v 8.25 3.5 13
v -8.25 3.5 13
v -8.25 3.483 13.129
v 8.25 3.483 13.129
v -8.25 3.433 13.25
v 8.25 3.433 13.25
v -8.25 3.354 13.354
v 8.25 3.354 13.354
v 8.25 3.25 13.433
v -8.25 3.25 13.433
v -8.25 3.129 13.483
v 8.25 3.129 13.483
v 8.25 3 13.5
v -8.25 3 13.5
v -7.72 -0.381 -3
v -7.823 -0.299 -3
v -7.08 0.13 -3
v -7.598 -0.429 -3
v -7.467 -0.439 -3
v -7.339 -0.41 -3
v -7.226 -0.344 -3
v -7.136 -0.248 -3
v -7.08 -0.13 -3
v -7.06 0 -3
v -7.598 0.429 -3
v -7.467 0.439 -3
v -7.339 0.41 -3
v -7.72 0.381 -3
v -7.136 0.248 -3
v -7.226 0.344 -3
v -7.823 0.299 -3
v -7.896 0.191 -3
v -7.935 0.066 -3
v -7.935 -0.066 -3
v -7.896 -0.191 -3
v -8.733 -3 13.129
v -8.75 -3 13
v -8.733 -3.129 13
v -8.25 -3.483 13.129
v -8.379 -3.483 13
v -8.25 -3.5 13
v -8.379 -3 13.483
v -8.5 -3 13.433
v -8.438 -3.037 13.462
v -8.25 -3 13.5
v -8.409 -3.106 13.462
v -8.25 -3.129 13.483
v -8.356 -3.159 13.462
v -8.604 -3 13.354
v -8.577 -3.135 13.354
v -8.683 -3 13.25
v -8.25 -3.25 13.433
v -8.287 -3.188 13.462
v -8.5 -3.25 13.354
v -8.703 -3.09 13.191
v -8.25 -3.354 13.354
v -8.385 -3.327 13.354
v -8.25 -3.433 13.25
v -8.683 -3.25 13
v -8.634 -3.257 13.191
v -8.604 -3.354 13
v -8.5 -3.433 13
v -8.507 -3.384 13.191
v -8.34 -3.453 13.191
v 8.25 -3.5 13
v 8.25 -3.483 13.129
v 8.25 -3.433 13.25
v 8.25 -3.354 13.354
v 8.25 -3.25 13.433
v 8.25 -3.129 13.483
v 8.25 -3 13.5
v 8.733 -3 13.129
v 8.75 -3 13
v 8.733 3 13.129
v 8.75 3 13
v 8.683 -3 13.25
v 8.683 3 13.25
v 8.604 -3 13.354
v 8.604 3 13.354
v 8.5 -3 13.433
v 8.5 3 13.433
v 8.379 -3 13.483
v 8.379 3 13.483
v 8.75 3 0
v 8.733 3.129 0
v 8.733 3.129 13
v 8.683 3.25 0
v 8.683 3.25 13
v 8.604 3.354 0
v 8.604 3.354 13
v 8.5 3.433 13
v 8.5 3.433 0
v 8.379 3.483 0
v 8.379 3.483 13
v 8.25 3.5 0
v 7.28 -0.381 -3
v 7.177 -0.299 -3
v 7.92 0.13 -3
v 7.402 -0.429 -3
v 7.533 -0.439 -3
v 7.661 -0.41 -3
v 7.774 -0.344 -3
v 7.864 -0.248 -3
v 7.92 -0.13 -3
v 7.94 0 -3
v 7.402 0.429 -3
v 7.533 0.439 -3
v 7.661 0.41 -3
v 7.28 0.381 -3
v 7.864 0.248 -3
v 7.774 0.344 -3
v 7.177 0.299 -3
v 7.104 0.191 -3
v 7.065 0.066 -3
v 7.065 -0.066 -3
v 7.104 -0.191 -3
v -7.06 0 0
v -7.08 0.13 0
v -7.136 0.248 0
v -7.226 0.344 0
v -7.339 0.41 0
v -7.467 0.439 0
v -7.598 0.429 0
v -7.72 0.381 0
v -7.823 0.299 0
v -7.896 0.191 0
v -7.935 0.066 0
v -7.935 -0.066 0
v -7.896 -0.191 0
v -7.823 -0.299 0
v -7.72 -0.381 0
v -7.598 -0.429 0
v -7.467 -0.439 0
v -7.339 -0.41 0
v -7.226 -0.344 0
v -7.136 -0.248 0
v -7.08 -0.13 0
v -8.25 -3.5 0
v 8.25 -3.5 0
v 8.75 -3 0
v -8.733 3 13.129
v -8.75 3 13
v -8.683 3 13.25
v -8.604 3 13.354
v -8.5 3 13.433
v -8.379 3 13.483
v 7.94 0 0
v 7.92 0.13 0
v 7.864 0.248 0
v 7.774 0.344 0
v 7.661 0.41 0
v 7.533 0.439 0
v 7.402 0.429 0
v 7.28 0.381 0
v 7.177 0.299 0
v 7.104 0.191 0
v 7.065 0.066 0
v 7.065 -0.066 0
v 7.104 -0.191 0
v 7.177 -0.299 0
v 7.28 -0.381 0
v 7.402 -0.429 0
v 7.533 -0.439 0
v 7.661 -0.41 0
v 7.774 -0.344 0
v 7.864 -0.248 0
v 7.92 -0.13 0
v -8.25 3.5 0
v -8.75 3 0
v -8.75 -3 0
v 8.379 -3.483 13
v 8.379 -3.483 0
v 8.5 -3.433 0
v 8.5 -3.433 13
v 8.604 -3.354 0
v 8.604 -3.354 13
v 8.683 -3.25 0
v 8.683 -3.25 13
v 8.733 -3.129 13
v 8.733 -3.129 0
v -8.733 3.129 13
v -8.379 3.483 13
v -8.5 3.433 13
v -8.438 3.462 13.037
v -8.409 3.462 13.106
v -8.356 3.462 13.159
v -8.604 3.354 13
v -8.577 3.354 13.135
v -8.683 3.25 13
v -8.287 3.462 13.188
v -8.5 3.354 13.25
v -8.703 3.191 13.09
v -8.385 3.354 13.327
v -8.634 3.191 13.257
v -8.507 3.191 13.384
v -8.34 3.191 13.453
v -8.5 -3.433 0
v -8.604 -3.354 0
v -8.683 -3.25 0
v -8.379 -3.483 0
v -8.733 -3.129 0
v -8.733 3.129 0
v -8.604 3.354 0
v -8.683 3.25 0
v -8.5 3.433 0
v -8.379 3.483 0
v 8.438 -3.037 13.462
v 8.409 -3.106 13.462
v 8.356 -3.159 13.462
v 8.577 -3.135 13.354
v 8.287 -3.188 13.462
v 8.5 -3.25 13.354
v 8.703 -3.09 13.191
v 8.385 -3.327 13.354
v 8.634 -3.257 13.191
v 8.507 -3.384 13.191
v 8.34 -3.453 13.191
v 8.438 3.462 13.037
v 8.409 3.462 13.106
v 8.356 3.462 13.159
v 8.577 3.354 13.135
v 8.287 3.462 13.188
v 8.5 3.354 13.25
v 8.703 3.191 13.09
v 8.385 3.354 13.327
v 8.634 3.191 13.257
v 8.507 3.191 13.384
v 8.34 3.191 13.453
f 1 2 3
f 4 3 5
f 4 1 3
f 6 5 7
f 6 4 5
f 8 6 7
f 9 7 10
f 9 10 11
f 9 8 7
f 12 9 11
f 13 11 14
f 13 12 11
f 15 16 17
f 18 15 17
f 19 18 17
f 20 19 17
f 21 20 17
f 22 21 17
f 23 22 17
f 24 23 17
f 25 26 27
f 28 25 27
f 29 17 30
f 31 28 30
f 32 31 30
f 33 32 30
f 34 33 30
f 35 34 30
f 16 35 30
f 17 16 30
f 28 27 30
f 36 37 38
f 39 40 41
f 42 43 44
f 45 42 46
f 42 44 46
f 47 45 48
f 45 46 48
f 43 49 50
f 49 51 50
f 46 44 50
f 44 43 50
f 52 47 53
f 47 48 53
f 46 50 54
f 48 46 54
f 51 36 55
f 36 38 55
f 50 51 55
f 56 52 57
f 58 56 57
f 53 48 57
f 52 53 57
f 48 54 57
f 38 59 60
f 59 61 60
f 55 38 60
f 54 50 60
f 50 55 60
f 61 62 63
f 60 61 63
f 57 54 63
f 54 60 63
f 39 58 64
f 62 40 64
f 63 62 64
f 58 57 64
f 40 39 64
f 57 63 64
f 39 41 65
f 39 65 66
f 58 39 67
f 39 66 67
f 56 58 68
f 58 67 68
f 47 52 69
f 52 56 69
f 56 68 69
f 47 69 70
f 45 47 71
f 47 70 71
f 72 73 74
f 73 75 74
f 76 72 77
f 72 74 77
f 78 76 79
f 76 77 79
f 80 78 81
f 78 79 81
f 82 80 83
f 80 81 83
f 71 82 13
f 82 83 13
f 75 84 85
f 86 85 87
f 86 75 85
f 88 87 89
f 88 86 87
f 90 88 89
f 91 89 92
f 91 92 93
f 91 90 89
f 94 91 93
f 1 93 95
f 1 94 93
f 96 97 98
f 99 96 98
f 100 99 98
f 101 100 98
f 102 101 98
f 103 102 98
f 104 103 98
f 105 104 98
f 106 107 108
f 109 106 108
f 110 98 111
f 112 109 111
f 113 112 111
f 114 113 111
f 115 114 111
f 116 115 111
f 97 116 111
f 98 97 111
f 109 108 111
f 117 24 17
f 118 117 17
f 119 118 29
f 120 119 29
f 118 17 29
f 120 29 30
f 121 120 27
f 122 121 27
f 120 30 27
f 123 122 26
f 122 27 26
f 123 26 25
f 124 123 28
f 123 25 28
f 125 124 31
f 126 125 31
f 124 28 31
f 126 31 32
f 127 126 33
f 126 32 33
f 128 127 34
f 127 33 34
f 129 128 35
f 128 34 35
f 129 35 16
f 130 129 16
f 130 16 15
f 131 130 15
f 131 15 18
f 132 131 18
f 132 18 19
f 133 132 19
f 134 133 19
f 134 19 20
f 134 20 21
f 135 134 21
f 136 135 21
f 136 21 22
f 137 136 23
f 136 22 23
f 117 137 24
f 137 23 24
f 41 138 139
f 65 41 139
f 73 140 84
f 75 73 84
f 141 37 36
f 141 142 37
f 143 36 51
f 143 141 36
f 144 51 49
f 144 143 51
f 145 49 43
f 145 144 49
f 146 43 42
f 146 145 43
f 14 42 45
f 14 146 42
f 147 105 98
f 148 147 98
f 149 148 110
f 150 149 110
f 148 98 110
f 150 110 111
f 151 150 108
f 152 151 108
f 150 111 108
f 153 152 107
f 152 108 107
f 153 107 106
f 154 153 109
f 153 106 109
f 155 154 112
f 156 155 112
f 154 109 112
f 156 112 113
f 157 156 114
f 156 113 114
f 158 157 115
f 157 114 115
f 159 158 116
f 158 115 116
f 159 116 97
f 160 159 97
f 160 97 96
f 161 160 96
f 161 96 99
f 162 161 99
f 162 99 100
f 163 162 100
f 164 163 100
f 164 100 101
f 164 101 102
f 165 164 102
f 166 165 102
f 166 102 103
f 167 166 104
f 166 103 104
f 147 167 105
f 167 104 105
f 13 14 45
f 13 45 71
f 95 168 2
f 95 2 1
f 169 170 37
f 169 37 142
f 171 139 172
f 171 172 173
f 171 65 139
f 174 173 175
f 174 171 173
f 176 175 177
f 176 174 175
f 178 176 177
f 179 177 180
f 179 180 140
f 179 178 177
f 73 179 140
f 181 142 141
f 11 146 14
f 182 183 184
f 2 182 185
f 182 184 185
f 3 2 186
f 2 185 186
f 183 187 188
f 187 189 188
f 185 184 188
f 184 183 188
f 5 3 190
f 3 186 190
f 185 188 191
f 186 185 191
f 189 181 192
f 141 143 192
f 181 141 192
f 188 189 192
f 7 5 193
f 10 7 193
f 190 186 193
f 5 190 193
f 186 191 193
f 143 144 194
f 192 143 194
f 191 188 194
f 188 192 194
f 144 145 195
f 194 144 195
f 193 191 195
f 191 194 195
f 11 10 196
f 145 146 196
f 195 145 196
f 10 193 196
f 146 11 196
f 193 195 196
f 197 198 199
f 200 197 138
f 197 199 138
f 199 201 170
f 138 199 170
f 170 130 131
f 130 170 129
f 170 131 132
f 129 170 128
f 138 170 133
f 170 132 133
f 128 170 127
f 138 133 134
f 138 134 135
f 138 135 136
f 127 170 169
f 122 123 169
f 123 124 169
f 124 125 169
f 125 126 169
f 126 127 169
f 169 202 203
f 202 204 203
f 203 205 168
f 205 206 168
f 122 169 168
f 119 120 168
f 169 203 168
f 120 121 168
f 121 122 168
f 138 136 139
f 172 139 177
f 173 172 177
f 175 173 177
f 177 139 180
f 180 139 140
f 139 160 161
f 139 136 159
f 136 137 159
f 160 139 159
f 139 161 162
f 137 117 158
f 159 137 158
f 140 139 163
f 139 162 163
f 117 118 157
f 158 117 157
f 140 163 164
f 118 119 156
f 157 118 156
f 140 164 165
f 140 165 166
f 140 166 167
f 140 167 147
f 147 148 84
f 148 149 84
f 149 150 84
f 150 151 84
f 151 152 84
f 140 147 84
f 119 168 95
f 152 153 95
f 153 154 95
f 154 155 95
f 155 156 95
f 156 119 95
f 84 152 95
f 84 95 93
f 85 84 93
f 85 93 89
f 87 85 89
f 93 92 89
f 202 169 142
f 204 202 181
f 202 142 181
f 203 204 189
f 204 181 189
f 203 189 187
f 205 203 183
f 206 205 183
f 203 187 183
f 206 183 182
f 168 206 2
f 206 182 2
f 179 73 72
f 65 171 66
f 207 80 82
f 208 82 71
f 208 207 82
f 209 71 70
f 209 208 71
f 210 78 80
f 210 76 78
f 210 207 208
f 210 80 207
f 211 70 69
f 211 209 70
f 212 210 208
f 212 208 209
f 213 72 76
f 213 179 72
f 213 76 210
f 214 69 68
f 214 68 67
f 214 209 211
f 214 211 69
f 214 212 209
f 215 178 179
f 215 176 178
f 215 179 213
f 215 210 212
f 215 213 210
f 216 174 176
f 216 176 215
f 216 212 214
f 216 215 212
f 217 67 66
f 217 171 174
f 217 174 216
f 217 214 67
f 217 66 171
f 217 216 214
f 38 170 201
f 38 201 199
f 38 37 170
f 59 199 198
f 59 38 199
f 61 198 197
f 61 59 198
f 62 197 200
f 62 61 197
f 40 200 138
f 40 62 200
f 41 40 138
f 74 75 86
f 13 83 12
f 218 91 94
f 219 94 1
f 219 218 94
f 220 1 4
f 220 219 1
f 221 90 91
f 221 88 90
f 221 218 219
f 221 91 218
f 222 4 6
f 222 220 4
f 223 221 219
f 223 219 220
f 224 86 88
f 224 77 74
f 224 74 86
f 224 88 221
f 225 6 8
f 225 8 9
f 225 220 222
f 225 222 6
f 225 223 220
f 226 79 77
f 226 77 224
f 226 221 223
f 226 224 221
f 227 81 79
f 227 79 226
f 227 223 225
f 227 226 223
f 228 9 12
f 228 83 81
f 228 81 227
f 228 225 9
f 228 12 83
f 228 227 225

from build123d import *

# Parameters (mm, degrees)
CYLINDER001_R     = 0.44
CYLINDER001_DEPTH = 3
CYLINDER_R        = 0.44
CYLINDER_DEPTH    = 3
BOX_W             = 17.5
BOX_H             = 7
BOX_DEPTH         = 13.5
FILLET_R          = 0.5


with BuildPart() as pin2:
    # Cylinder001 → Cylinder001 (new body)
    with BuildSketch(Plane(origin=(7.5, 0, -3), x_dir=(1, 0, 0), z_dir=(0, 0, 1))):
        Circle(CYLINDER001_R)
    extrude(amount=CYLINDER001_DEPTH)


with BuildPart() as pin1:
    # Cylinder → Cylinder (new body)
    with BuildSketch(Plane(origin=(-7.5, 0, -3), x_dir=(1, 0, 0), z_dir=(0, 0, 1))):
        Circle(CYLINDER_R)
    extrude(amount=CYLINDER_DEPTH)


with BuildPart() as caparv1500w80l1750t700h1350:
    # Box → Box (new body)
    with BuildSketch(Plane(origin=(-8.75, -3.5, 0), x_dir=(1, 0, 0), z_dir=(0, 0, 1))):
        with Locations((8.75, 3.5)):
            Rectangle(BOX_W, BOX_H)
    extrude(amount=BOX_DEPTH)

    # Fillet
    fillet_edges = [caparv1500w80l1750t700h1350.edges().sort_by_distance(p)[0] for p in [
        (-8.75, -3.5, 6.75),
        (-8.75, 0, 13.5),
        (-8.75, 3.5, 6.75),
        (8.75, -3.5, 6.75),
        (8.75, 0, 13.5),
        (8.75, 3.5, 6.75),
        (0, -3.5, 13.5),
        (0, 3.5, 13.5),
    ]]
    fillet(fillet_edges, radius=FILLET_R)

    # Fusion: union Pin1
    add(pin1.part)

    # Fusion001: union Pin2
    add(pin2.part)


solid = caparv1500w80l1750t700h1350.part
